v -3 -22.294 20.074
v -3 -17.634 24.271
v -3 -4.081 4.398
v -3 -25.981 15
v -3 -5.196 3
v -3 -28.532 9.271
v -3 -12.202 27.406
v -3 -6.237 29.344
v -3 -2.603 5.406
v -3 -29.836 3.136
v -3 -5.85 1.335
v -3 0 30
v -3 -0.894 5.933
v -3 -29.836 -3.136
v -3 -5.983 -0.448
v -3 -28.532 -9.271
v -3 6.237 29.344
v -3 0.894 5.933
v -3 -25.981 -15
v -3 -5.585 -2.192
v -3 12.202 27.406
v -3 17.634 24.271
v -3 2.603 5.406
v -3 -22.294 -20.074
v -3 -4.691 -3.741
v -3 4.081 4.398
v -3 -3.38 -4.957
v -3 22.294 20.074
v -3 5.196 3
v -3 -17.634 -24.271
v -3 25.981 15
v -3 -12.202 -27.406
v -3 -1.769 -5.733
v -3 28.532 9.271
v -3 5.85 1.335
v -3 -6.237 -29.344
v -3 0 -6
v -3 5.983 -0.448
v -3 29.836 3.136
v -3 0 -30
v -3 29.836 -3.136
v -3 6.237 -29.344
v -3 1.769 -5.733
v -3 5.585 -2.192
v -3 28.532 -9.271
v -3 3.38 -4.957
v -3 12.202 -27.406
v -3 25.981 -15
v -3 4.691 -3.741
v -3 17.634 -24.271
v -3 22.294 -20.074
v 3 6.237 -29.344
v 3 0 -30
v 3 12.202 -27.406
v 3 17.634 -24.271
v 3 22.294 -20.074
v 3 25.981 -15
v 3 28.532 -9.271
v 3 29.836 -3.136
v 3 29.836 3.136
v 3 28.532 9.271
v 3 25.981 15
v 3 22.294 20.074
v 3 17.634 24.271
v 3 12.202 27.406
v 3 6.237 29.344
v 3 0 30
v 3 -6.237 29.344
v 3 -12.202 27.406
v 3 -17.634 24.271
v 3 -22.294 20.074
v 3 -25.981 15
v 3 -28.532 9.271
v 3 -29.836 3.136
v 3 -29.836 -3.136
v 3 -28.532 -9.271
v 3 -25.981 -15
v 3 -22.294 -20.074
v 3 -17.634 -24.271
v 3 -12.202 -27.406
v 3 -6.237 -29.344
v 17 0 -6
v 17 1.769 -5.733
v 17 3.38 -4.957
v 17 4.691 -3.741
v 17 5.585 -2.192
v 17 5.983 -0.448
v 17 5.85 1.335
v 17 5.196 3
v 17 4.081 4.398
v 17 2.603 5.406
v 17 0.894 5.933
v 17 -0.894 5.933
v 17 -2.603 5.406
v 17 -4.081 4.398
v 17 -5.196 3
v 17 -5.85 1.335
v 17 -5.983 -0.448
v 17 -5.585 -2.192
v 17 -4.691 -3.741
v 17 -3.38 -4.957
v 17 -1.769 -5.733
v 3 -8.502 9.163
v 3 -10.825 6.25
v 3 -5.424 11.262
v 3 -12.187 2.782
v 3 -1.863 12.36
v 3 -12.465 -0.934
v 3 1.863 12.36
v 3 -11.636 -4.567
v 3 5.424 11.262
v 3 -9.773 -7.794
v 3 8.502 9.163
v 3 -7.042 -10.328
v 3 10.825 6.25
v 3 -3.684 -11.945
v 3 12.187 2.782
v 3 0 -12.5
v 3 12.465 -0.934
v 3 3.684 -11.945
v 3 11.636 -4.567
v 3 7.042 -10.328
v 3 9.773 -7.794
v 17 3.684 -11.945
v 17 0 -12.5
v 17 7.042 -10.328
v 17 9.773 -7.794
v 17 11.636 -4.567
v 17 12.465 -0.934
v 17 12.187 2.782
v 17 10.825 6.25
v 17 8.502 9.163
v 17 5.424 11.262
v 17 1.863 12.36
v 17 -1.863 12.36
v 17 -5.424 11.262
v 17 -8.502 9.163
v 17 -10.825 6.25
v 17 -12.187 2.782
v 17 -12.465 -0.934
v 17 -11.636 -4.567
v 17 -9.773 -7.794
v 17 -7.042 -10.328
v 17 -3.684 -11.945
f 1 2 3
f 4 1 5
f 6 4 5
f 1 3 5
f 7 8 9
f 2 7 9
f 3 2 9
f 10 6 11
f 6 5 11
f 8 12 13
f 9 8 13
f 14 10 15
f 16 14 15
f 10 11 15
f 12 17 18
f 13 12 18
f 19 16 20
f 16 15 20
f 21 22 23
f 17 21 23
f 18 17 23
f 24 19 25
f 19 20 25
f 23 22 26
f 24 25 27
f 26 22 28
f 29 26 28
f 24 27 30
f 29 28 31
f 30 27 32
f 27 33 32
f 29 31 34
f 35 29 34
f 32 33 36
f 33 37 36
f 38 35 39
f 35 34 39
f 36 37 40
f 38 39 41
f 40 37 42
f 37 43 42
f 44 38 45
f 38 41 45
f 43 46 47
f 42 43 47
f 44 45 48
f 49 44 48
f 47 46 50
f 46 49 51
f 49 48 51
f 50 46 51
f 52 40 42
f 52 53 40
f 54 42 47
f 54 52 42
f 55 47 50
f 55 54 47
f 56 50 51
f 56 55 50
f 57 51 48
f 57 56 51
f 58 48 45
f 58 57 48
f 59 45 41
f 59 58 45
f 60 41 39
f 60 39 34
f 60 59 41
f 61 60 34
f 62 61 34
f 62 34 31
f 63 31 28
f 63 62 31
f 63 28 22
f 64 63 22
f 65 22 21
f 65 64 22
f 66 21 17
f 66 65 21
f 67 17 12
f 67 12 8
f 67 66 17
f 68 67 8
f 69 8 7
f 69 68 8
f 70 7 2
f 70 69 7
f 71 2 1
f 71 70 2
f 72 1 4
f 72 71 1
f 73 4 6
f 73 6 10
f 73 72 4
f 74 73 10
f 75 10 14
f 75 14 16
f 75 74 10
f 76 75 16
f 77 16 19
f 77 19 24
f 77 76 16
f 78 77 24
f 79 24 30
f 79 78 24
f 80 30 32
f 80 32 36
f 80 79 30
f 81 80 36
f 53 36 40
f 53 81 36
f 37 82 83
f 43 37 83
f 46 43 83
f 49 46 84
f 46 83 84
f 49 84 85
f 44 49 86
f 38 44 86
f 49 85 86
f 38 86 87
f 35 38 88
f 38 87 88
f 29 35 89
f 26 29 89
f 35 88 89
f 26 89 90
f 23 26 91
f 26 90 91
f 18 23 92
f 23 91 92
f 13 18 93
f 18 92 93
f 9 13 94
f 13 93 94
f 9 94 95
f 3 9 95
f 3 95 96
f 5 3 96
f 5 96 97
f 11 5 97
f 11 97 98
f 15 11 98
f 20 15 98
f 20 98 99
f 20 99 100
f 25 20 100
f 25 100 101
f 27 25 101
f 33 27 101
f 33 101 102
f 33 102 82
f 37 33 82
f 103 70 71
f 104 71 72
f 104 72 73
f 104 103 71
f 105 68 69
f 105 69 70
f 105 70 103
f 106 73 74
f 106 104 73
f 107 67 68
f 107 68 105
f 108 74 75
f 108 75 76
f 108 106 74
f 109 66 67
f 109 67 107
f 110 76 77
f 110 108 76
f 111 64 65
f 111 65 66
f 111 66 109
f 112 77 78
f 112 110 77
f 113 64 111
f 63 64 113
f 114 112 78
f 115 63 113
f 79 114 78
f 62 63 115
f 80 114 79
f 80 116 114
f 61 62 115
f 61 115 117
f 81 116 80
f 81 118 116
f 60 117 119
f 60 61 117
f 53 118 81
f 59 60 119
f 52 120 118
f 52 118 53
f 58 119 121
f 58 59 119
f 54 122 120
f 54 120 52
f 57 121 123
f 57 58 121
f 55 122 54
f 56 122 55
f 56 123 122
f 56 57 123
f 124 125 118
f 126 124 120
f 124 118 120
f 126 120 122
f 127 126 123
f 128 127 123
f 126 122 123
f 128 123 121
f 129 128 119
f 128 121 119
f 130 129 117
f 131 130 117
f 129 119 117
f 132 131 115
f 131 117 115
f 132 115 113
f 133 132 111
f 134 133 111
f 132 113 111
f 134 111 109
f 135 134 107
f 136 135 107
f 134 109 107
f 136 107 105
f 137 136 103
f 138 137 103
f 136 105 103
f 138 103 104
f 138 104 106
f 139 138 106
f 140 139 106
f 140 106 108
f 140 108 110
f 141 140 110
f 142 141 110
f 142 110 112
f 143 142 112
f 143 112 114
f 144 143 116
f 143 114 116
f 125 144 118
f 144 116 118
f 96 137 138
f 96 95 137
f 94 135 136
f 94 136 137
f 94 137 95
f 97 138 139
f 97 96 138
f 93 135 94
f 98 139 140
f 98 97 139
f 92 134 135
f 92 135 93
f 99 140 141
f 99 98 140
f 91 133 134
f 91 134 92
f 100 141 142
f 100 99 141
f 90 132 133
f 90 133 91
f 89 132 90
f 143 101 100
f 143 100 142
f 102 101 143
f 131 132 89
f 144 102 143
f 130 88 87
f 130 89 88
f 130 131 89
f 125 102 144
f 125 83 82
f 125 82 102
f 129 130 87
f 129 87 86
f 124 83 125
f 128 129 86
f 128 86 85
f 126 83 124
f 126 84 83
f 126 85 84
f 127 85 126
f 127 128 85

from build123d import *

# Parameters (mm, degrees)
SKETCH1_R           = 30
BOSS_EXTRUDE1_DEPTH = 3
SKETCH2_R           = 12.5
BOSS_EXTRUDE2_DEPTH = 14
SKETCH3_R           = 6
CUT_EXTRUDE1_DEPTH  = 47.904157598


with BuildPart() as part:
    # Sketch1 → Boss-Extrude1 (new, symmetric)
    with BuildSketch(Plane(origin=(0, 0, 0), x_dir=(0, 0, -1), z_dir=(1, 0, 0))):
        Circle(SKETCH1_R)
    extrude(amount=BOSS_EXTRUDE1_DEPTH, both=True)

    # Sketch2 → Boss-Extrude2 (add)
    with BuildSketch(Plane(origin=(3, 0, 0), x_dir=(0, 0, -1), z_dir=(1, 0, 0))):
        Circle(SKETCH2_R)
    extrude(amount=BOSS_EXTRUDE2_DEPTH)

    # Sketch3 → Cut-Extrude1 (cut, through all)
    with BuildSketch(Plane(origin=(17, 0, 0), x_dir=(0, 0, -1), z_dir=(1, 0, 0))):
        Circle(SKETCH3_R)
    extrude(amount=-CUT_EXTRUDE1_DEPTH, mode=Mode.SUBTRACT)


solid = part.part
